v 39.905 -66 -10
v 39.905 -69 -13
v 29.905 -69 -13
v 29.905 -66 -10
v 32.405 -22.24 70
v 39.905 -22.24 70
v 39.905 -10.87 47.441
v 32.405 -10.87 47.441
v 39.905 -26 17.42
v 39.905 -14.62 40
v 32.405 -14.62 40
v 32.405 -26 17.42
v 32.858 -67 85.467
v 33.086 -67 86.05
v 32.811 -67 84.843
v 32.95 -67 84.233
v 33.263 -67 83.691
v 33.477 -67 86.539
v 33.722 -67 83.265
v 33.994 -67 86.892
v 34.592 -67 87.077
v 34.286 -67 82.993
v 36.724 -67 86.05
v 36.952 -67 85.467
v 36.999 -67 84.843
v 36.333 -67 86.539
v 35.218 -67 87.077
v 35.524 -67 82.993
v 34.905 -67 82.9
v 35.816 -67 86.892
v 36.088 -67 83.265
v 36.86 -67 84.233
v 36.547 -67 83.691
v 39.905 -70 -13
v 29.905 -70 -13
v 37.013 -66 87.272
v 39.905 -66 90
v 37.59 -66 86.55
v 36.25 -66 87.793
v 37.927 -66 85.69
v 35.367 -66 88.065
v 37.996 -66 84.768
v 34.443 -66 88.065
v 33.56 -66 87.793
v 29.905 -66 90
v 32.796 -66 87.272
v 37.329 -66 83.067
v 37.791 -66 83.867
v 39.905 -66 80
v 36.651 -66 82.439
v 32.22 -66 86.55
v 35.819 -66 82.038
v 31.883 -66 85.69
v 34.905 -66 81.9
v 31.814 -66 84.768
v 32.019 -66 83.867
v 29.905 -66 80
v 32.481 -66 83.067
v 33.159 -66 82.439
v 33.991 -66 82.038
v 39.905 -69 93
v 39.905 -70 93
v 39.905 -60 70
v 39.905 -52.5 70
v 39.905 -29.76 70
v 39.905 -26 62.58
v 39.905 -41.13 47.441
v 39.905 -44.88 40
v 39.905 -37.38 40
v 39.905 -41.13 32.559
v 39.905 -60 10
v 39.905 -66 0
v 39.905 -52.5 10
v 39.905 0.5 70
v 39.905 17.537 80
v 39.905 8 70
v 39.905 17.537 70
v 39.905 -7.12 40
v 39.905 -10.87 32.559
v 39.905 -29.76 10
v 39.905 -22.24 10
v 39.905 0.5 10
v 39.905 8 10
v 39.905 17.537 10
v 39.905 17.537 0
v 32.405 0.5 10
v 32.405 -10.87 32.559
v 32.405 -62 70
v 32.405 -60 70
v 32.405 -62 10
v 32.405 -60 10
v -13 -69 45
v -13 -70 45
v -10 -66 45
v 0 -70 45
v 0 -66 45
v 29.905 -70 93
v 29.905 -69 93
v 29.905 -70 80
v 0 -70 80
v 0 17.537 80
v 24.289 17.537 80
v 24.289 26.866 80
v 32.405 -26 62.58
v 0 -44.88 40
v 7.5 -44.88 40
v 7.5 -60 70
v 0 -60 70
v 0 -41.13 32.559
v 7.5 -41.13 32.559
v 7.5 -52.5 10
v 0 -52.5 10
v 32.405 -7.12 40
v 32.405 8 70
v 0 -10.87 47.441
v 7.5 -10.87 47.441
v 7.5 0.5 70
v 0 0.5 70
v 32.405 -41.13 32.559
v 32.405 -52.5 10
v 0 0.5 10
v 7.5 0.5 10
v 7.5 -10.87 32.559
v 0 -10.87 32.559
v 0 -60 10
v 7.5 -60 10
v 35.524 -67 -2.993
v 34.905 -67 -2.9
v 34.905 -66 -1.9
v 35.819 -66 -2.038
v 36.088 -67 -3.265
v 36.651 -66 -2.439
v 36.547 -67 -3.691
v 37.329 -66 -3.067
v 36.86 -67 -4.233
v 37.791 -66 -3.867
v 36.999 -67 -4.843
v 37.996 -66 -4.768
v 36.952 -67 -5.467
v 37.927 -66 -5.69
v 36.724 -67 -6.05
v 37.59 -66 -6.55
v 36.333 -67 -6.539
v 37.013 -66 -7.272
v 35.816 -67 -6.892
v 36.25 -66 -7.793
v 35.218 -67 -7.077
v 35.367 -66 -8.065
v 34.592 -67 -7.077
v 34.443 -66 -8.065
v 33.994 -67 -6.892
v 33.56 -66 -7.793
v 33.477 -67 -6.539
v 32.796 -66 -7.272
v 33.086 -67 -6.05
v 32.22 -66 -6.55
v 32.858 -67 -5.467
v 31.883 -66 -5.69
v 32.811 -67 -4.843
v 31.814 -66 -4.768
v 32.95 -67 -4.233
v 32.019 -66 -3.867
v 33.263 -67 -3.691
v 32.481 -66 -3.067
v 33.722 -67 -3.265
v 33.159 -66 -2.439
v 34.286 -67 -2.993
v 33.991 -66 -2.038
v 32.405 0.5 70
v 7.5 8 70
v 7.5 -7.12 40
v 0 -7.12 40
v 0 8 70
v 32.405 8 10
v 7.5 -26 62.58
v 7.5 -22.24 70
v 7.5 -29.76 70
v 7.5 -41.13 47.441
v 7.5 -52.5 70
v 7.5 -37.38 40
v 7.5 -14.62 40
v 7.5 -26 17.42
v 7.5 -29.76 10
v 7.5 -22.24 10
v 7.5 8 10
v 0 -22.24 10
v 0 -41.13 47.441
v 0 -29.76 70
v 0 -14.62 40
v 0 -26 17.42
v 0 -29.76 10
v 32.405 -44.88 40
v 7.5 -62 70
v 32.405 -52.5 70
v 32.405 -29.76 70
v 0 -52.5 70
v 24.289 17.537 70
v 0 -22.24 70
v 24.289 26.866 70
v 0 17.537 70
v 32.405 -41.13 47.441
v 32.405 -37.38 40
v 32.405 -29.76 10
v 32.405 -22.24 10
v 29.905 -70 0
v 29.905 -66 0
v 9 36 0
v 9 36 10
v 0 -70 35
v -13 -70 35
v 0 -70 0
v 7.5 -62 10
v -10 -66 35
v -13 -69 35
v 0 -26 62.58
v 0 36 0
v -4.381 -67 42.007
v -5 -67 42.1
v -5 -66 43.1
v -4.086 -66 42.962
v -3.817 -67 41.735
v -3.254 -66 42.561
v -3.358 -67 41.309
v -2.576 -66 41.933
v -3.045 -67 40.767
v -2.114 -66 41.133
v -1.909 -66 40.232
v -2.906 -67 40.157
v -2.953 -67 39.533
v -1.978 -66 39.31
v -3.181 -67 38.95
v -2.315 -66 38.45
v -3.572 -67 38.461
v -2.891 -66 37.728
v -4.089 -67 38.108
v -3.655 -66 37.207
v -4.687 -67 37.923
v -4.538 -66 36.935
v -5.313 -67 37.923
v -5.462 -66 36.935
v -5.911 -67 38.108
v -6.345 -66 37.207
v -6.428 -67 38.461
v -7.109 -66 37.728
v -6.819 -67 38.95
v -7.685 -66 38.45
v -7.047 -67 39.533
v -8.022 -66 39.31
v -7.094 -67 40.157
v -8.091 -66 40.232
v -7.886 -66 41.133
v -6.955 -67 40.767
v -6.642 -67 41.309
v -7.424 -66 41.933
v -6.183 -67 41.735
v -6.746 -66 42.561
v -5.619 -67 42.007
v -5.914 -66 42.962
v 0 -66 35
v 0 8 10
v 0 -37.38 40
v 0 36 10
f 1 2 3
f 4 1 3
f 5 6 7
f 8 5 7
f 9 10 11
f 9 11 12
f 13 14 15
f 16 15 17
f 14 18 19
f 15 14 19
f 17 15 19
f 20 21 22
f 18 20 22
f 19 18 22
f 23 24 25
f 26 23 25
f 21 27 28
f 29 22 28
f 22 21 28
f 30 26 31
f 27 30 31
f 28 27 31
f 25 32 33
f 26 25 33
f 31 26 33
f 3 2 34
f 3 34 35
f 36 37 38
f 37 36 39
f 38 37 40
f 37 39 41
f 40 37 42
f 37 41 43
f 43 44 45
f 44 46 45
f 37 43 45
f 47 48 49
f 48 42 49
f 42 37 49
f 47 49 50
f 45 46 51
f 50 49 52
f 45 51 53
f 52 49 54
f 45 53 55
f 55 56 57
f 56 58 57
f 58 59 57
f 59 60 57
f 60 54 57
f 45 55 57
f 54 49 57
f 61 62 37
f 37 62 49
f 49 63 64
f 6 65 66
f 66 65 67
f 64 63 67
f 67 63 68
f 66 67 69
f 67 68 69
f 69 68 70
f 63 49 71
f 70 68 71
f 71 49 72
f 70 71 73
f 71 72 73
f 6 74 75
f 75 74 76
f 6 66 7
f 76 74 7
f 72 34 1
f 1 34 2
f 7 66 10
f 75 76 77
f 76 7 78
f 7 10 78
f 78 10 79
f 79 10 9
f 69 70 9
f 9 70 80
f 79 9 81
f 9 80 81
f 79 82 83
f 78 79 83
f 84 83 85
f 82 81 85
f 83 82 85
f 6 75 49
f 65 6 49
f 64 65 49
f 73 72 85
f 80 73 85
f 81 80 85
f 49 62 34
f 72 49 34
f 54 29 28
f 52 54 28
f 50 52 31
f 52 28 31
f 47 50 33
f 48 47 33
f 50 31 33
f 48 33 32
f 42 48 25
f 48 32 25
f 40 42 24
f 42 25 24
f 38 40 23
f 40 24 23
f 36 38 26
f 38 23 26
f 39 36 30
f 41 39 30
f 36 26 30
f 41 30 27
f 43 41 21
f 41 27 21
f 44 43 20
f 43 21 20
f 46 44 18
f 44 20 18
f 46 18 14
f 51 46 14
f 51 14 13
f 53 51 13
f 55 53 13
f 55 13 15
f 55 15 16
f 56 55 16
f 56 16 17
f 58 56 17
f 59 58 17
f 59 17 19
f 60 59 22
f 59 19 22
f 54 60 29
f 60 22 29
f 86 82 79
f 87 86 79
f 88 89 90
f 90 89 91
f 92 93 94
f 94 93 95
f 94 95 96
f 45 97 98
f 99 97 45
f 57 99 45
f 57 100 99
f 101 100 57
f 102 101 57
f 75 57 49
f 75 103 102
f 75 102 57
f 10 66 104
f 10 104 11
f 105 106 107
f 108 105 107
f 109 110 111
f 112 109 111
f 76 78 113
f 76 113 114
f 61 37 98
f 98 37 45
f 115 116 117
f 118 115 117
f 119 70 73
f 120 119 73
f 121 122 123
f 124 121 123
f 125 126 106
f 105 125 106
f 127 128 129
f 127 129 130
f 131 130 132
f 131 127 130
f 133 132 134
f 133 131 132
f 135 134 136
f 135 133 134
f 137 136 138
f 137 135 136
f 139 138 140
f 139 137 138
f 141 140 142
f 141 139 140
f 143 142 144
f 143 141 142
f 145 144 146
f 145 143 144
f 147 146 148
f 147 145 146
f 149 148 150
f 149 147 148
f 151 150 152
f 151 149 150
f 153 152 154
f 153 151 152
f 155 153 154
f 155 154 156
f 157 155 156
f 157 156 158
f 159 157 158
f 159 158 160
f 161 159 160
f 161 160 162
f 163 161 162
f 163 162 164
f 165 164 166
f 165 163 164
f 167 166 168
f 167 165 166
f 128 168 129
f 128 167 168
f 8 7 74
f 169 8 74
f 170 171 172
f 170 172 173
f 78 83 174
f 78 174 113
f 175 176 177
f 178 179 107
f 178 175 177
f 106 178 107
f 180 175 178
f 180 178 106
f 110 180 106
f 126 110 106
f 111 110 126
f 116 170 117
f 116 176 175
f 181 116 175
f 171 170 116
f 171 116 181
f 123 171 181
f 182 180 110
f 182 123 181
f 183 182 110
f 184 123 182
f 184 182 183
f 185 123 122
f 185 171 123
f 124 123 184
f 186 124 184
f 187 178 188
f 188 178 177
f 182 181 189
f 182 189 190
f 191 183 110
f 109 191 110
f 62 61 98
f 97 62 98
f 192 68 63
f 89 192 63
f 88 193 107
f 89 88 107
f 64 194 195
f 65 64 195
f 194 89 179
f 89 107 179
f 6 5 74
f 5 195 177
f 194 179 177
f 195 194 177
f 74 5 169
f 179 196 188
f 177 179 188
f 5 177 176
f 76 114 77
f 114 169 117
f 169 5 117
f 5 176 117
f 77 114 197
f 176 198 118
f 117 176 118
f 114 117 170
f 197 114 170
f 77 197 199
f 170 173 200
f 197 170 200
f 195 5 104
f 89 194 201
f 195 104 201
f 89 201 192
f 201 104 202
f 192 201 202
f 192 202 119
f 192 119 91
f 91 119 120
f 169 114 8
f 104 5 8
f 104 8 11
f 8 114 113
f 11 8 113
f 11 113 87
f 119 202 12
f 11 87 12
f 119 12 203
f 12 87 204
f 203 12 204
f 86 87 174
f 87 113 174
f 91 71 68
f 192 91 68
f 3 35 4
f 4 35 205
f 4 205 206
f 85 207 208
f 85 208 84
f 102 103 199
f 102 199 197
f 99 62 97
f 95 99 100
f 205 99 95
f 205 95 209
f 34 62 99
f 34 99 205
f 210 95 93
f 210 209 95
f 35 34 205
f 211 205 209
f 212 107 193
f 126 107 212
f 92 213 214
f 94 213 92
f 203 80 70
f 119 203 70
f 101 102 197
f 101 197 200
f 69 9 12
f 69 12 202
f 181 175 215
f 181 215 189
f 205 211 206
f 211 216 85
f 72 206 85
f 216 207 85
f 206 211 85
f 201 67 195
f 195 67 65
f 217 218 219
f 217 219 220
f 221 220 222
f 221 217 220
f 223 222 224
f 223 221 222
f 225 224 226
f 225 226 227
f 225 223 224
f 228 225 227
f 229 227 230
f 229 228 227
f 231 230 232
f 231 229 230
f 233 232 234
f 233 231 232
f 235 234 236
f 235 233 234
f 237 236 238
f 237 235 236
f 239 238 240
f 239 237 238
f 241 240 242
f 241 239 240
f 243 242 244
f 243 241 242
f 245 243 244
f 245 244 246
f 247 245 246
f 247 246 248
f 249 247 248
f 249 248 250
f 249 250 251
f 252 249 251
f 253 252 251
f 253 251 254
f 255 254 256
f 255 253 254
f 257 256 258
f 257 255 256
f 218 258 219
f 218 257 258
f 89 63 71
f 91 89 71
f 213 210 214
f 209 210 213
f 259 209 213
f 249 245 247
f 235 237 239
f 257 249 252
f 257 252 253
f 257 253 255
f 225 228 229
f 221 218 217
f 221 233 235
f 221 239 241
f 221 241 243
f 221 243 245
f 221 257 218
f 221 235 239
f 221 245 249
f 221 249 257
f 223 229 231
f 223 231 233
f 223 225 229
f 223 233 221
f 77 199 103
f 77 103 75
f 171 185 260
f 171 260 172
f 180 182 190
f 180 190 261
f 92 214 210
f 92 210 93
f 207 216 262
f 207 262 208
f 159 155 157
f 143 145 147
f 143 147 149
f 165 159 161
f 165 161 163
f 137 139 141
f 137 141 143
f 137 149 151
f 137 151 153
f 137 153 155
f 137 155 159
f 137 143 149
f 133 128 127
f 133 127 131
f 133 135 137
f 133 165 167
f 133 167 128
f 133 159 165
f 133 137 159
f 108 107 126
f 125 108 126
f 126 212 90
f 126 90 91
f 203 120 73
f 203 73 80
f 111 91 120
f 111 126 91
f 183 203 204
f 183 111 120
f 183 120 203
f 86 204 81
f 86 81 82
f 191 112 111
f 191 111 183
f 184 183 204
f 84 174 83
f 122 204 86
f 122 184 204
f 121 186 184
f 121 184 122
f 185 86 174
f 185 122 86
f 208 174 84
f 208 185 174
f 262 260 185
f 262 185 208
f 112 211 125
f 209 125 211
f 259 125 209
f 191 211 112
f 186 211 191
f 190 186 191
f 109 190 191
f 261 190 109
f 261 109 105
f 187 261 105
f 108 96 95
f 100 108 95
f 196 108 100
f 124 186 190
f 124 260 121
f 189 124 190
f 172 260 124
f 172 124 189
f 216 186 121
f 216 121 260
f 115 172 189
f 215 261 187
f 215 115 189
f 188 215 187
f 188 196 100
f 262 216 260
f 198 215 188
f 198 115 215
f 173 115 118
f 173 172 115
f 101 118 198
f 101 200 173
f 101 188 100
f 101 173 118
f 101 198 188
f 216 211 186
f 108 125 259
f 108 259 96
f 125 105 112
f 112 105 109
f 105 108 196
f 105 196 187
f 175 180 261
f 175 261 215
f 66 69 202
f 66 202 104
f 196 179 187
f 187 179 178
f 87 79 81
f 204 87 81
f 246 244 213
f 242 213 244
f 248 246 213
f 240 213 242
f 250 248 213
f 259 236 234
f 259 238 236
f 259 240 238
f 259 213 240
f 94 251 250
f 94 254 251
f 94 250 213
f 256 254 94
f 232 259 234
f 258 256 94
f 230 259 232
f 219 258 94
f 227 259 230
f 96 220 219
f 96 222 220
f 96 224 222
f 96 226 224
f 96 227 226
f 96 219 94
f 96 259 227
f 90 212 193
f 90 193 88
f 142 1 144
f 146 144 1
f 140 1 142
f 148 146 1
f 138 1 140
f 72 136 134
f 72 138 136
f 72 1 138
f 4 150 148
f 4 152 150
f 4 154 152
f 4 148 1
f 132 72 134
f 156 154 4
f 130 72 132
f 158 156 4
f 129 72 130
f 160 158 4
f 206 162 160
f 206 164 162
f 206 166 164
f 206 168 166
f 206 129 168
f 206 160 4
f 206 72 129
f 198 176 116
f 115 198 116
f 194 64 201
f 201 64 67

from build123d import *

# Parameters (mm, degrees)
BOSS_EXTRUDE1_DEPTH      = 80
SKETCH2_W                = 60
SKETCH2_H                = 28
CUT_EXTRUDE1_DEPTH       = 80
SKETCH3_W                = 39.904961116
SKETCH3_H                = 80
BOSS_EXTRUDE2_DEPTH      = 70
CUT_EXTRUDE4_REACH       = 115.545
SKETCH6_W                = 24.904961116
SKETCH6_H                = 60
CUT_EXTRUDE5_DEPTH       = 70
SKETCH7_W                = 10
SKETCH7_H                = 4
BOSS_EXTRUDE3_DEPTH      = 13
SKETCH8_R                = 3.1
CUT_EXTRUDE6_DEPTH       = 1
CHAMFER1_SIZE            = 1
CHAMFER2_SIZE            = 3
CHAMFER2_OF_MIRROR1_SIZE = 3
SKETCH9_W                = 10
SKETCH9_H                = 4
BOSS_EXTRUDE4_DEPTH      = 13
SKETCH10_R               = 3.1
CUT_EXTRUDE7_DEPTH       = 1
CHAMFER3_SIZE            = 3
CHAMFER4_SIZE            = 1
CHAMFER5_SIZE            = 1
CUT_EXTRUDE8_REACH       = 125.05


with BuildPart() as part:
    # Sketch1 → Boss-Extrude1 (new body)
    with BuildSketch(Plane.XY):
        Polygon((9, 36), (39.904961116, 17.536972664), (39.904961116, 0), (0, 0), (0, 36), align=None)
    extrude(amount=BOSS_EXTRUDE1_DEPTH)

    # Sketch2 → Cut-Extrude1 (cut)
    with BuildSketch(Plane.ZY):
        with Locations((40, 22)):
            Rectangle(SKETCH2_W, SKETCH2_H)
    extrude(amount=-CUT_EXTRUDE1_DEPTH, mode=Mode.SUBTRACT)

    # Sketch3 → Boss-Extrude2 (add)
    with BuildSketch(Plane.XZ):
        with Locations((19.952480558, 40)):
            Rectangle(SKETCH3_W, SKETCH3_H)
    extrude(amount=BOSS_EXTRUDE2_DEPTH)

    # Sketch4 → Cut-Extrude4 (cut, up to next)
    with BuildSketch(Plane(origin=(39.904961116, 0, 0), x_dir=(0, 0, -1), z_dir=(1, 0, 0)), mode=Mode.PRIVATE) as cut_extrude4_sk1:
        Polygon((-10, 8), (-40, -7.119896394), (-70, 8), align=None)
    cut_extrude4_tool1 = extrude(cut_extrude4_sk1.sketch, amount=-CUT_EXTRUDE4_REACH, mode=Mode.PRIVATE) & part.part
    # Sketch4 → Cut-Extrude4 (cut, up to next)
    with BuildSketch(Plane(origin=(39.904961116, 0, 0), x_dir=(0, 0, -1), z_dir=(1, 0, 0)), mode=Mode.PRIVATE) as cut_extrude4_sk2:
        Polygon((-47.440527175, -10.869896394), (-70, 0.5), (-70, -22.239792788), align=None)
    cut_extrude4_tool2 = extrude(cut_extrude4_sk2.sketch, amount=-CUT_EXTRUDE4_REACH, mode=Mode.PRIVATE) & part.part
    # Sketch4 → Cut-Extrude4 (cut, up to next)
    with BuildSketch(Plane(origin=(39.904961116, 0, 0), x_dir=(0, 0, -1), z_dir=(1, 0, 0)), mode=Mode.PRIVATE) as cut_extrude4_sk3:
        Polygon((-47.440527175, -41.130103606), (-70, -29.760207212), (-70, -52.5), align=None)
    cut_extrude4_tool3 = extrude(cut_extrude4_sk3.sketch, amount=-CUT_EXTRUDE4_REACH, mode=Mode.PRIVATE) & part.part
    # Sketch4 → Cut-Extrude4 (cut, up to next)
    with BuildSketch(Plane(origin=(39.904961116, 0, 0), x_dir=(0, 0, -1), z_dir=(1, 0, 0)), mode=Mode.PRIVATE) as cut_extrude4_sk4:
        Polygon((-10, -60), (-40, -44.880103606), (-70, -60), align=None)
    cut_extrude4_tool4 = extrude(cut_extrude4_sk4.sketch, amount=-CUT_EXTRUDE4_REACH, mode=Mode.PRIVATE) & part.part
    # Sketch4 → Cut-Extrude4 (cut, up to next)
    with BuildSketch(Plane(origin=(39.904961116, 0, 0), x_dir=(0, 0, -1), z_dir=(1, 0, 0)), mode=Mode.PRIVATE) as cut_extrude4_sk5:
        Polygon((-10, -52.5), (-10, -29.760207212), (-32.559472825, -41.130103606), align=None)
    cut_extrude4_tool5 = extrude(cut_extrude4_sk5.sketch, amount=-CUT_EXTRUDE4_REACH, mode=Mode.PRIVATE) & part.part
    # Sketch4 → Cut-Extrude4 (cut, up to next)
    with BuildSketch(Plane(origin=(39.904961116, 0, 0), x_dir=(0, 0, -1), z_dir=(1, 0, 0)), mode=Mode.PRIVATE) as cut_extrude4_sk6:
        Polygon((-62.579725368, -26), (-40, -14.619896394), (-17.420274632, -26), (-40, -37.380103606), align=None)
    cut_extrude4_tool6 = extrude(cut_extrude4_sk6.sketch, amount=-CUT_EXTRUDE4_REACH, mode=Mode.PRIVATE) & part.part
    # Sketch4 → Cut-Extrude4 (cut, up to next)
    with BuildSketch(Plane(origin=(39.904961116, 0, 0), x_dir=(0, 0, -1), z_dir=(1, 0, 0)), mode=Mode.PRIVATE) as cut_extrude4_sk7:
        Polygon((-10, -22.239792788), (-10, 0.5), (-32.559472825, -10.869896394), align=None)
    cut_extrude4_tool7 = extrude(cut_extrude4_sk7.sketch, amount=-CUT_EXTRUDE4_REACH, mode=Mode.PRIVATE) & part.part
    add(cut_extrude4_tool1.solids().sort_by_distance((39.904961, 2.960035, 40))[0], mode=Mode.SUBTRACT)
    add(cut_extrude4_tool2.solids().sort_by_distance((39.904961, -10.869896, 62.480176))[0], mode=Mode.SUBTRACT)
    add(cut_extrude4_tool3.solids().sort_by_distance((39.904961, -41.130104, 62.480176))[0], mode=Mode.SUBTRACT)
    add(cut_extrude4_tool4.solids().sort_by_distance((39.904961, -54.960035, 40))[0], mode=Mode.SUBTRACT)
    add(cut_extrude4_tool5.solids().sort_by_distance((39.904961, -41.130104, 17.519824))[0], mode=Mode.SUBTRACT)
    add(cut_extrude4_tool6.solids().sort_by_distance((39.904961, -26, 40))[0], mode=Mode.SUBTRACT)
    add(cut_extrude4_tool7.solids().sort_by_distance((39.904961, -10.869896, 17.519824))[0], mode=Mode.SUBTRACT)

    # Sketch6 → Cut-Extrude5 (cut)
    with BuildSketch(Plane(origin=(0, 8, 0), x_dir=(1, 0, 0), z_dir=(0, 1, 0))):
        with Locations((19.952480558, -40)):
            Rectangle(SKETCH6_W, SKETCH6_H)
    extrude(amount=-CUT_EXTRUDE5_DEPTH, mode=Mode.SUBTRACT)

    # Sketch7 → Boss-Extrude3 (add)
    with BuildSketch(Plane(origin=(0, 0, 0), x_dir=(-1, 0, 0), z_dir=(0, 0, -1))):
        with Locations((-34.904961116, -68)):
            Rectangle(SKETCH7_W, SKETCH7_H)
    boss_extrude3 = extrude(amount=BOSS_EXTRUDE3_DEPTH)

    # Sketch8 → Cut-Extrude6 (cut)
    with BuildSketch(Plane(origin=(0, -66, 0), x_dir=(1, 0, 0), z_dir=(0, 1, 0))):
        with Locations(Location((34.904961116, 5, 0), (0, 0, 270))):
            Circle(SKETCH8_R)
    cut_extrude6 = extrude(amount=-CUT_EXTRUDE6_DEPTH, mode=Mode.SUBTRACT)

    # Chamfer1
    chamfer1_edges = [part.edges().sort_by_distance(p)[0] for p in [
        (34.904961116, -67, -8.1),
    ]]
    chamfer(chamfer1_edges, length=CHAMFER1_SIZE - 0.0001)  # a hair under: the kernel refuses the full size

    # Chamfer2
    chamfer2_edges = [part.edges().sort_by_distance(p)[0] for p in [
        (34.904961116, -66, -13),
    ]]
    chamfer(chamfer2_edges, length=CHAMFER2_SIZE)

    # Mirror1: Boss-Extrude3, Cut-Extrude6 across plane
    add(boss_extrude3.mirror(Plane.XY.offset(40)))
    add(cut_extrude6.mirror(Plane.XY.offset(40)), mode=Mode.SUBTRACT)

    # Chamfer2 of Mirror1
    chamfer2_of_mirror1_edges = [part.edges().sort_by_distance(p)[0] for p in [
        (34.904961116, -66, 93),
    ]]
    chamfer(chamfer2_of_mirror1_edges, length=CHAMFER2_OF_MIRROR1_SIZE)

    # Sketch9 → Boss-Extrude4 (add)
    with BuildSketch(Plane.ZY):
        with Locations((40, -68)):
            Rectangle(SKETCH9_W, SKETCH9_H)
    extrude(amount=BOSS_EXTRUDE4_DEPTH)

    # Sketch10 → Cut-Extrude7 (cut)
    with BuildSketch(Plane(origin=(0, -66, 0), x_dir=(1, 0, 0), z_dir=(0, 1, 0))):
        with Locations(Location((-5, -40, 0), (0, 0, 270))):
            Circle(SKETCH10_R)
    extrude(amount=-CUT_EXTRUDE7_DEPTH, mode=Mode.SUBTRACT)

    # Chamfer3
    chamfer3_edges = [part.edges().sort_by_distance(p)[0] for p in [
        (-13, -66, 40),
    ]]
    chamfer(chamfer3_edges, length=CHAMFER3_SIZE)

    # Chamfer4
    chamfer4_edges = [part.edges().sort_by_distance(p)[0] for p in [
        (-5, -67, 36.9),
    ]]
    chamfer(chamfer4_edges, length=CHAMFER4_SIZE - 0.0001)  # a hair under: the kernel refuses the full size

    # Chamfer5
    chamfer5_edges = [part.edges().sort_by_distance(p)[0] for p in [
        (34.904961116, -67, 88.1),
    ]]
    chamfer(chamfer5_edges, length=CHAMFER5_SIZE - 0.0001)  # a hair under: the kernel refuses the full size

    # Sketch11 → Cut-Extrude8 (cut, up to next)
    with BuildSketch(Plane.XY.offset(80), mode=Mode.PRIVATE) as cut_extrude8_sk1:
        Polygon((0, 17.536972664), (0, 36), (9, 36), (24.289010788, 26.866145307), (24.289010788, 17.536972664), align=None)
    cut_extrude8_tool1 = extrude(cut_extrude8_sk1.sketch, amount=-CUT_EXTRUDE8_REACH, mode=Mode.PRIVATE) & part.part
    add(cut_extrude8_tool1.solids().sort_by_distance((10.844723, 25.627535, 80))[0], mode=Mode.SUBTRACT)


solid = part.part
